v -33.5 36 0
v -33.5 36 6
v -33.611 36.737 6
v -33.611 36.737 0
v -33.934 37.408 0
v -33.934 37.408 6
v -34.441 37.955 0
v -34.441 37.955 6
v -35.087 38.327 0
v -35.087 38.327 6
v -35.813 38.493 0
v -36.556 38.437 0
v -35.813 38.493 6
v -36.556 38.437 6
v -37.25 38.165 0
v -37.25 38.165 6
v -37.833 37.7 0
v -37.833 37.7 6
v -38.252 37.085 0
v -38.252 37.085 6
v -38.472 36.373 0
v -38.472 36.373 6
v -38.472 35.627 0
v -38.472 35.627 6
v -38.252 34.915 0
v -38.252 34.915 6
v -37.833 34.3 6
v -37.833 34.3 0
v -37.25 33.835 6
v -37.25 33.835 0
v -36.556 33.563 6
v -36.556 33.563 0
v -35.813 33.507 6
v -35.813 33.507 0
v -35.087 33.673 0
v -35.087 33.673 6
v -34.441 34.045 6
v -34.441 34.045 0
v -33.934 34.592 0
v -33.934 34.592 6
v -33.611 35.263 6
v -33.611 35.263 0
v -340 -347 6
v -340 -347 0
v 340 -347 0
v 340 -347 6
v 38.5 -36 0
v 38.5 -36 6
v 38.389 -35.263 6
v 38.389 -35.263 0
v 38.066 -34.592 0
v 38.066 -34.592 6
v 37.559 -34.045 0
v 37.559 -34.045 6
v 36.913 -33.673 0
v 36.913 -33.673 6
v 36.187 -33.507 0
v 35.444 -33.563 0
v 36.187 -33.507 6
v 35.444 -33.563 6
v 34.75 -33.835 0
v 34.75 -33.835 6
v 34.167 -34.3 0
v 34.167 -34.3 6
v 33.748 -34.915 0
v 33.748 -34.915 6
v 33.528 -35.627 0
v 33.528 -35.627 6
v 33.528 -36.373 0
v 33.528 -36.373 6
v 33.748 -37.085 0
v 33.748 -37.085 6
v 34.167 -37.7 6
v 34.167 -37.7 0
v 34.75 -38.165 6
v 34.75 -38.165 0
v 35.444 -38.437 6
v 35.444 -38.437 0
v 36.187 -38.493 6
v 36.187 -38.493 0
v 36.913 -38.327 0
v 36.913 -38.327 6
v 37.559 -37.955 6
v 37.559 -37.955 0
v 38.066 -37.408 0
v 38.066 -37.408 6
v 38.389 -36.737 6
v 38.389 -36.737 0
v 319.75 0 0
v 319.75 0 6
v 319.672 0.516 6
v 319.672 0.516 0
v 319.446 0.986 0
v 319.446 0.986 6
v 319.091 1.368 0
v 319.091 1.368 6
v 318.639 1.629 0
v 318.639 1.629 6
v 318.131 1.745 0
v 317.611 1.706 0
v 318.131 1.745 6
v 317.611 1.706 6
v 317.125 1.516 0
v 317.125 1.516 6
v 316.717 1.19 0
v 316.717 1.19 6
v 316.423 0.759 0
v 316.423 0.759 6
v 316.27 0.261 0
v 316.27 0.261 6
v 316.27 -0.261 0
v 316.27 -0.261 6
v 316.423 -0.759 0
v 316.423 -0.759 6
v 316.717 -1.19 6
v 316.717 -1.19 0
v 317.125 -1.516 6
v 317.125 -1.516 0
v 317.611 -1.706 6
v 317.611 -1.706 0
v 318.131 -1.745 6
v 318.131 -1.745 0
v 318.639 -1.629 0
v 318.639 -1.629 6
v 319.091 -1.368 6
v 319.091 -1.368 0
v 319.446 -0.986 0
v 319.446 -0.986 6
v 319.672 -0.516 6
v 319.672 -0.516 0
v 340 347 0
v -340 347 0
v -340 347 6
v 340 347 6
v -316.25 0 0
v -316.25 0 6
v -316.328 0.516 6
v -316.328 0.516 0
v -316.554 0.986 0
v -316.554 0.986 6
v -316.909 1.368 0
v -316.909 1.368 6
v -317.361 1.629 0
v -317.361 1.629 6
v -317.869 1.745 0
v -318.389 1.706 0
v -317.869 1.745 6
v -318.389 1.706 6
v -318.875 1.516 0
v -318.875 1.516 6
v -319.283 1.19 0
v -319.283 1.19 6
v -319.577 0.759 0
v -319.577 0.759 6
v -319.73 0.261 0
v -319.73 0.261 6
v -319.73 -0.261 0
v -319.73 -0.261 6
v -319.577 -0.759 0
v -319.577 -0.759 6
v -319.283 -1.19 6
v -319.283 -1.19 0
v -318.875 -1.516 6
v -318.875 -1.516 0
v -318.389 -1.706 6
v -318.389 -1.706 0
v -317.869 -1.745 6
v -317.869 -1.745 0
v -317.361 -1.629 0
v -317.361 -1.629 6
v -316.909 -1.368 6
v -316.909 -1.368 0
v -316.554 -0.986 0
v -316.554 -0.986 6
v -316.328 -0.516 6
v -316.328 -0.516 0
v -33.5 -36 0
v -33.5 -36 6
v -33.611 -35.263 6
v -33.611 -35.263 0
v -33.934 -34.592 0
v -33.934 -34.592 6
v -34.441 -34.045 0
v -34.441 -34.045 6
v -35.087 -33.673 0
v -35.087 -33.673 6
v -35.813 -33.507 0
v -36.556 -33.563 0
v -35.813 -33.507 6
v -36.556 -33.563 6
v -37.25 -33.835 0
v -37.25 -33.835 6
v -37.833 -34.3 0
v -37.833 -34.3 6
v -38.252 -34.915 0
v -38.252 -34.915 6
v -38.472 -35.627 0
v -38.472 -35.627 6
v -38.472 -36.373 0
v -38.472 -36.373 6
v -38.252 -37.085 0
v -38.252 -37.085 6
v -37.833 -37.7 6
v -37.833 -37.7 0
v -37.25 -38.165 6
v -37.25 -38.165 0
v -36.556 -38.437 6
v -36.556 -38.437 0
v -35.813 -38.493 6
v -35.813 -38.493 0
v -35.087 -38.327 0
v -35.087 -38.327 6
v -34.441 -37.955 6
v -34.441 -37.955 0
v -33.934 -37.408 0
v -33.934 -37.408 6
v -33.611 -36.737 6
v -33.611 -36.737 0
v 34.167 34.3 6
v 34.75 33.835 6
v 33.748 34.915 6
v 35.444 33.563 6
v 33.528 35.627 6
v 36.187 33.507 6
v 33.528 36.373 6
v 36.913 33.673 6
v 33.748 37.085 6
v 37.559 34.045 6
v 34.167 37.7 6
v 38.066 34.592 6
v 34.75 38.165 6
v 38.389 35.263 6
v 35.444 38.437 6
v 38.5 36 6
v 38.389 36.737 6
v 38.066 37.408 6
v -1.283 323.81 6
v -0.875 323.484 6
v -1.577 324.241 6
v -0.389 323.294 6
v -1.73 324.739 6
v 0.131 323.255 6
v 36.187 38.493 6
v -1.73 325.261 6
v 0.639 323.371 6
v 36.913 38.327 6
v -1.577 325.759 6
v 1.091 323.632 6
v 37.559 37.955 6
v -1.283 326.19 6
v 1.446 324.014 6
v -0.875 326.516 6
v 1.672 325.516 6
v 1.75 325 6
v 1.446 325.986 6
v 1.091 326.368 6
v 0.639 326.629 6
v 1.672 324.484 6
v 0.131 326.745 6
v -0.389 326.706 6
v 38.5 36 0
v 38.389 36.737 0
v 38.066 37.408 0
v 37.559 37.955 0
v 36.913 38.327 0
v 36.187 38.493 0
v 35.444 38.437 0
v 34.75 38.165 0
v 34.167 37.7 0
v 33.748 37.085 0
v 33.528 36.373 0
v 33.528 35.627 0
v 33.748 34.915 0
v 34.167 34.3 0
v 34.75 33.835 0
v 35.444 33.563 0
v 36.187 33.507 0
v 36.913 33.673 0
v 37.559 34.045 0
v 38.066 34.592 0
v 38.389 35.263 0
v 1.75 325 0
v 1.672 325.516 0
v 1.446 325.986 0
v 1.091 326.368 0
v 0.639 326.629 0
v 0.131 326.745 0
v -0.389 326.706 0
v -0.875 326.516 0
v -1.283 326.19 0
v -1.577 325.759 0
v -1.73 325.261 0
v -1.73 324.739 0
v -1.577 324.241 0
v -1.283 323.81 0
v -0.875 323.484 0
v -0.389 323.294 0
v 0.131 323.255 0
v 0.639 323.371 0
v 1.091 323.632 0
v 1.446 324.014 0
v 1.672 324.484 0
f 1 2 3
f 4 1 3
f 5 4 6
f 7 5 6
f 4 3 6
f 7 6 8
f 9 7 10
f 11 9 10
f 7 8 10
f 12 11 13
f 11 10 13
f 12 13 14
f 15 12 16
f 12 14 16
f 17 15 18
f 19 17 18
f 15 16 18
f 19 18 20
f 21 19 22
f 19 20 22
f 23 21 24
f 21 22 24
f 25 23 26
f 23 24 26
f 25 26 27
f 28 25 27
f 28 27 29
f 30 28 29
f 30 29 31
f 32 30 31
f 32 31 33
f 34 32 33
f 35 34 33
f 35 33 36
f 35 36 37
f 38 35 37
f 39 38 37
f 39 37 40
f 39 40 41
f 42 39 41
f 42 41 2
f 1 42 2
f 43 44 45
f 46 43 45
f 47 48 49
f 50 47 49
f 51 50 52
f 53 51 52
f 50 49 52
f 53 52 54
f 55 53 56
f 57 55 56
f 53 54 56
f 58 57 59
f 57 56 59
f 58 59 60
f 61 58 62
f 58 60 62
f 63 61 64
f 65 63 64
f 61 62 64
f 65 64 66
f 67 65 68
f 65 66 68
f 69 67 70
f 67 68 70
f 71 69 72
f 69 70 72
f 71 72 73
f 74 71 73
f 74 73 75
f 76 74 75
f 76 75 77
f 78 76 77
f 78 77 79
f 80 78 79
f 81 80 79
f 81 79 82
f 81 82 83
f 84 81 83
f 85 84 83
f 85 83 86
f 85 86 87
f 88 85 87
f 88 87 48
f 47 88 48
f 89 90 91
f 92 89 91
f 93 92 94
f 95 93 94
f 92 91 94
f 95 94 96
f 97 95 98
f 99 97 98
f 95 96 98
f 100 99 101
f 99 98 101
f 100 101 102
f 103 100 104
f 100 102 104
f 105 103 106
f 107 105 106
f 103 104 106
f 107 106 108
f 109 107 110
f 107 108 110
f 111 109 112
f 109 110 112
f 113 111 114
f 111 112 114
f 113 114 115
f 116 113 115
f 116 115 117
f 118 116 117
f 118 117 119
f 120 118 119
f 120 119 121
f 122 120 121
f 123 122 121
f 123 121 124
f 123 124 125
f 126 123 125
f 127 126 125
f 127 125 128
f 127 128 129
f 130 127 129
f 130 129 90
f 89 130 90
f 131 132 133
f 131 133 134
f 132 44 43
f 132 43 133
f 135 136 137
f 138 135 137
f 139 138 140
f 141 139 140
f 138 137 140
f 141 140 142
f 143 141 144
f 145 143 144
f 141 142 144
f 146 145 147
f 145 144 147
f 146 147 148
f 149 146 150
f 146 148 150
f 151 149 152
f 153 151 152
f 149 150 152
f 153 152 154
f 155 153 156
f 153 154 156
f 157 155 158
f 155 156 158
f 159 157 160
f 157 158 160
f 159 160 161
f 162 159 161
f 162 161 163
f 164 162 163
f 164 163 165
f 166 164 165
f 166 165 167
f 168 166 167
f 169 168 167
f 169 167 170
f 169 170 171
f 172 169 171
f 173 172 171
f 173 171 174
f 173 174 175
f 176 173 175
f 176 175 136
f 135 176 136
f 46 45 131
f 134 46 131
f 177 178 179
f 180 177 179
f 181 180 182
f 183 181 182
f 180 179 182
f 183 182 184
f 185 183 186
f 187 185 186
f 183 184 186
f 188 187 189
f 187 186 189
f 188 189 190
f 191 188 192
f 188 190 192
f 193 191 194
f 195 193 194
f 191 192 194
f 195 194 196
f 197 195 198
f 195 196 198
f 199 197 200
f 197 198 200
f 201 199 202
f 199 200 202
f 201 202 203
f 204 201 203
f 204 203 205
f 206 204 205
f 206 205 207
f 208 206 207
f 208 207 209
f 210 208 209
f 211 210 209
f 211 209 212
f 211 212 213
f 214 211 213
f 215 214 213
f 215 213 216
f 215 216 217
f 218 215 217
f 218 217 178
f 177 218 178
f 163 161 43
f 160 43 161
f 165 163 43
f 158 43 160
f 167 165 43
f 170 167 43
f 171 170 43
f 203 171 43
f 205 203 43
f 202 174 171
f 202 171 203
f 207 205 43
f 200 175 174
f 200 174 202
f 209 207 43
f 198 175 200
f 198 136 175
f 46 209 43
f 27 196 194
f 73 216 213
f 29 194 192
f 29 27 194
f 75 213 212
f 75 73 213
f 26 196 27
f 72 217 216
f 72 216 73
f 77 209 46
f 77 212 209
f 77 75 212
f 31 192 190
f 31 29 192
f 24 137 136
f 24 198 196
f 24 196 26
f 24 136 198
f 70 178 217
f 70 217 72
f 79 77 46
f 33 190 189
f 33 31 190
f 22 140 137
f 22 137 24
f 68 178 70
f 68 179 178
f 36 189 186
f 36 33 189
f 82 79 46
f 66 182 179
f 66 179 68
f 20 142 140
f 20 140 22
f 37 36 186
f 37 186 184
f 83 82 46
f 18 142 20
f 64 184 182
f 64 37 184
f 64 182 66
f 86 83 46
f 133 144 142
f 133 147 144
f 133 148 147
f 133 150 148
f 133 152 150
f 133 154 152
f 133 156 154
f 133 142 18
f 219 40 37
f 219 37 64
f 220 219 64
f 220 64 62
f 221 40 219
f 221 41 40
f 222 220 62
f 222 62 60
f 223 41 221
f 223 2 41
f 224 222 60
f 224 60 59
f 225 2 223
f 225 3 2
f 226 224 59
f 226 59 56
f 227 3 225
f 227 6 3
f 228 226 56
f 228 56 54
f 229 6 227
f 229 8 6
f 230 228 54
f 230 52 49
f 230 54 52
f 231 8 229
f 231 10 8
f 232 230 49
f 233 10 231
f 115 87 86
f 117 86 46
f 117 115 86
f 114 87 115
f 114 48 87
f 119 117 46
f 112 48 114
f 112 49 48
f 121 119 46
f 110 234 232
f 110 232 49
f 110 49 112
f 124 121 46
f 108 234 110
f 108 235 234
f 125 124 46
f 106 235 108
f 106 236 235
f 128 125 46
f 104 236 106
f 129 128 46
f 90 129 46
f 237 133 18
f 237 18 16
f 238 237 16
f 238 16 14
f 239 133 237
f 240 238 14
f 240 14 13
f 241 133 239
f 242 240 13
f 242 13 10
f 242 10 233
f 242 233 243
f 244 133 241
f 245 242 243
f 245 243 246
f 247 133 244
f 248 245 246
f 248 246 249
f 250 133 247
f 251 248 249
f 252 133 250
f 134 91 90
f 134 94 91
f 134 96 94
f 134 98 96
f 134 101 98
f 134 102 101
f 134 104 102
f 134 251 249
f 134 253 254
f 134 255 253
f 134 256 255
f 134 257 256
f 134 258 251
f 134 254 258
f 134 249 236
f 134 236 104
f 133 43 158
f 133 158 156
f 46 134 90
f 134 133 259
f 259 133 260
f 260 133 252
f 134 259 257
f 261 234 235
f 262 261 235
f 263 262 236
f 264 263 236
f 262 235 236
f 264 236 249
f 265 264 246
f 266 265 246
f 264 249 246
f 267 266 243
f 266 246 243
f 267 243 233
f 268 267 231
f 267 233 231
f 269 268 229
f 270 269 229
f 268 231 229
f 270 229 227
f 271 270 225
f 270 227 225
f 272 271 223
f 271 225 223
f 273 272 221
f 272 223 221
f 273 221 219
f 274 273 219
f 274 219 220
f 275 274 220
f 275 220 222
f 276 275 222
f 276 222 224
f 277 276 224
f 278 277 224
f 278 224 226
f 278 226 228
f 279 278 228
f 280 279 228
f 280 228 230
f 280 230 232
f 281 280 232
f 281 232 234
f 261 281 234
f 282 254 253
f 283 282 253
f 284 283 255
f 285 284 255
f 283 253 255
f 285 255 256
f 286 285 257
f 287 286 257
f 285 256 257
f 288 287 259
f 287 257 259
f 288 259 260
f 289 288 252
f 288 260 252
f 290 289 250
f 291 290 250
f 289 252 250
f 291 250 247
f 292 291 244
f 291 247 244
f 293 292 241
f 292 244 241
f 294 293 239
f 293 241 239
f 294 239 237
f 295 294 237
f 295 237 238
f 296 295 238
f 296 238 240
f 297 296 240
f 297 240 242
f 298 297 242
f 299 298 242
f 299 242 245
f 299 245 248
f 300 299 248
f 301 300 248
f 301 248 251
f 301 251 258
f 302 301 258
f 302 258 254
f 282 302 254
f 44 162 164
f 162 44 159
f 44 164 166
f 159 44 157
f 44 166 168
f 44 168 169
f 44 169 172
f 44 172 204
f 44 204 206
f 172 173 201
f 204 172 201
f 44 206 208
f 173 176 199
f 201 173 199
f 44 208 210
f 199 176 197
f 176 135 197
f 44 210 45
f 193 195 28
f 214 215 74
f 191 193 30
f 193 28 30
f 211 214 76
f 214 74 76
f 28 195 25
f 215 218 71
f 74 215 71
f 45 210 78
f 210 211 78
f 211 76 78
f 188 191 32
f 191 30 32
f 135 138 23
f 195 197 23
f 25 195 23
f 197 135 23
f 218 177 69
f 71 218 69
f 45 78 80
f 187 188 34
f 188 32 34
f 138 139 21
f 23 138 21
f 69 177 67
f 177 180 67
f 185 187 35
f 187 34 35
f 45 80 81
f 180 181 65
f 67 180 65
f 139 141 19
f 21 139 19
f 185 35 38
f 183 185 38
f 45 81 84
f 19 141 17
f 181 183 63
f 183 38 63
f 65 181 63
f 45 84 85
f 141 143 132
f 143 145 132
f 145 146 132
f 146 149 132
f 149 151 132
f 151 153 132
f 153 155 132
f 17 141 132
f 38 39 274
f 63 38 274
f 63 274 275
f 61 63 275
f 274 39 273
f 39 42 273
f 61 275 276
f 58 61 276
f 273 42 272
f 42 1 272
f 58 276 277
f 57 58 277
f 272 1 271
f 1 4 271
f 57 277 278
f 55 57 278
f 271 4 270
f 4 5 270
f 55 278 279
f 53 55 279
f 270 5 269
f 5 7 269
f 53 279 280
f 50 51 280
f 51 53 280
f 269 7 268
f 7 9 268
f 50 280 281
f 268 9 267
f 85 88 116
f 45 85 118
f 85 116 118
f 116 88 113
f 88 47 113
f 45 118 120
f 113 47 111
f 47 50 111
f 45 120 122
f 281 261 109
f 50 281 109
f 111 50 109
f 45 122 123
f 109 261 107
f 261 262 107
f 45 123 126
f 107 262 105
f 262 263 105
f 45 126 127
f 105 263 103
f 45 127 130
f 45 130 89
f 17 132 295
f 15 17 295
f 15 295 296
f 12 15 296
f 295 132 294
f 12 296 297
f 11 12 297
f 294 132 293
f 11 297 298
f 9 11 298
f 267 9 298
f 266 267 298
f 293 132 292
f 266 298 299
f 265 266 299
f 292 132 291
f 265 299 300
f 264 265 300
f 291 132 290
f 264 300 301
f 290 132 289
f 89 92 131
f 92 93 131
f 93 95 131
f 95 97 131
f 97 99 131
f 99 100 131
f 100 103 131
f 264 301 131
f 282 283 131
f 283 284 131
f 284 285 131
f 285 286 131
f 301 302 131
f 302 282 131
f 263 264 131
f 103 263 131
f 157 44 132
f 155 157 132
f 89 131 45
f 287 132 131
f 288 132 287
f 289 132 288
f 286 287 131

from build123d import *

# Parameters (mm, degrees)
ESQUISSE1_W             = 680
ESQUISSE1_H             = 694
BOSS_EXTRU_1_DEPTH      = 6
ENL_V_MAT_EXTRU_1_REACH = 8
ESQUISSE2_R             = 2.5
ESQUISSE2_R_2           = 1.75


with BuildPart() as part:
    # Esquisse1 → Boss.-Extru.1 (new body)
    with BuildSketch(Plane.XY):
        Rectangle(ESQUISSE1_W, ESQUISSE1_H)
    extrude(amount=BOSS_EXTRU_1_DEPTH)

    # Esquisse2 → Enlèv. mat.-Extru.1 (cut, up to next)
    with BuildSketch(Plane.XY.offset(6), mode=Mode.PRIVATE) as enl_v_mat_extru_1_sk1:
        with Locations((-36, 36)):
            Circle(ESQUISSE2_R)
    enl_v_mat_extru_1_tool1 = extrude(enl_v_mat_extru_1_sk1.sketch, amount=-ENL_V_MAT_EXTRU_1_REACH, mode=Mode.PRIVATE) & part.part
    add(enl_v_mat_extru_1_tool1.solids().sort_by_distance((-36, 36, 6))[0], mode=Mode.SUBTRACT)
    # Esquisse2 → Enlèv. mat.-Extru.1 (cut, up to next)
    with BuildSketch(Plane.XY.offset(6), mode=Mode.PRIVATE) as enl_v_mat_extru_1_sk2:
        with Locations((-36, -36)):
            Circle(ESQUISSE2_R)
    enl_v_mat_extru_1_tool2 = extrude(enl_v_mat_extru_1_sk2.sketch, amount=-ENL_V_MAT_EXTRU_1_REACH, mode=Mode.PRIVATE) & part.part
    add(enl_v_mat_extru_1_tool2.solids().sort_by_distance((-36, -36, 6))[0], mode=Mode.SUBTRACT)
    # Esquisse2 → Enlèv. mat.-Extru.1 (cut, up to next)
    with BuildSketch(Plane.XY.offset(6), mode=Mode.PRIVATE) as enl_v_mat_extru_1_sk3:
        with Locations((36, -36)):
            Circle(ESQUISSE2_R)
    enl_v_mat_extru_1_tool3 = extrude(enl_v_mat_extru_1_sk3.sketch, amount=-ENL_V_MAT_EXTRU_1_REACH, mode=Mode.PRIVATE) & part.part
    add(enl_v_mat_extru_1_tool3.solids().sort_by_distance((36, -36, 6))[0], mode=Mode.SUBTRACT)
    # Esquisse2 → Enlèv. mat.-Extru.1 (cut, up to next)
    with BuildSketch(Plane.XY.offset(6), mode=Mode.PRIVATE) as enl_v_mat_extru_1_sk4:
        with Locations((36, 36)):
            Circle(ESQUISSE2_R)
    enl_v_mat_extru_1_tool4 = extrude(enl_v_mat_extru_1_sk4.sketch, amount=-ENL_V_MAT_EXTRU_1_REACH, mode=Mode.PRIVATE) & part.part
    add(enl_v_mat_extru_1_tool4.solids().sort_by_distance((36, 36, 6))[0], mode=Mode.SUBTRACT)
    # Esquisse2 → Enlèv. mat.-Extru.1 (cut, up to next)
    with BuildSketch(Plane.XY.offset(6), mode=Mode.PRIVATE) as enl_v_mat_extru_1_sk5:
        with Locations((-318, 0)):
            Circle(ESQUISSE2_R_2)
    enl_v_mat_extru_1_tool5 = extrude(enl_v_mat_extru_1_sk5.sketch, amount=-ENL_V_MAT_EXTRU_1_REACH, mode=Mode.PRIVATE) & part.part
    add(enl_v_mat_extru_1_tool5.solids().sort_by_distance((-318, 0, 6))[0], mode=Mode.SUBTRACT)
    # Esquisse2 → Enlèv. mat.-Extru.1 (cut, up to next)
    with BuildSketch(Plane.XY.offset(6), mode=Mode.PRIVATE) as enl_v_mat_extru_1_sk6:
        with Locations((318, 0)):
            Circle(ESQUISSE2_R_2)
    enl_v_mat_extru_1_tool6 = extrude(enl_v_mat_extru_1_sk6.sketch, amount=-ENL_V_MAT_EXTRU_1_REACH, mode=Mode.PRIVATE) & part.part
    add(enl_v_mat_extru_1_tool6.solids().sort_by_distance((318, 0, 6))[0], mode=Mode.SUBTRACT)
    # Esquisse2 → Enlèv. mat.-Extru.1 (cut, up to next)
    with BuildSketch(Plane.XY.offset(6), mode=Mode.PRIVATE) as enl_v_mat_extru_1_sk7:
        with Locations((0, 325)):
            Circle(ESQUISSE2_R_2)
    enl_v_mat_extru_1_tool7 = extrude(enl_v_mat_extru_1_sk7.sketch, amount=-ENL_V_MAT_EXTRU_1_REACH, mode=Mode.PRIVATE) & part.part
    add(enl_v_mat_extru_1_tool7.solids().sort_by_distance((0, 325, 6))[0], mode=Mode.SUBTRACT)


solid = part.part
